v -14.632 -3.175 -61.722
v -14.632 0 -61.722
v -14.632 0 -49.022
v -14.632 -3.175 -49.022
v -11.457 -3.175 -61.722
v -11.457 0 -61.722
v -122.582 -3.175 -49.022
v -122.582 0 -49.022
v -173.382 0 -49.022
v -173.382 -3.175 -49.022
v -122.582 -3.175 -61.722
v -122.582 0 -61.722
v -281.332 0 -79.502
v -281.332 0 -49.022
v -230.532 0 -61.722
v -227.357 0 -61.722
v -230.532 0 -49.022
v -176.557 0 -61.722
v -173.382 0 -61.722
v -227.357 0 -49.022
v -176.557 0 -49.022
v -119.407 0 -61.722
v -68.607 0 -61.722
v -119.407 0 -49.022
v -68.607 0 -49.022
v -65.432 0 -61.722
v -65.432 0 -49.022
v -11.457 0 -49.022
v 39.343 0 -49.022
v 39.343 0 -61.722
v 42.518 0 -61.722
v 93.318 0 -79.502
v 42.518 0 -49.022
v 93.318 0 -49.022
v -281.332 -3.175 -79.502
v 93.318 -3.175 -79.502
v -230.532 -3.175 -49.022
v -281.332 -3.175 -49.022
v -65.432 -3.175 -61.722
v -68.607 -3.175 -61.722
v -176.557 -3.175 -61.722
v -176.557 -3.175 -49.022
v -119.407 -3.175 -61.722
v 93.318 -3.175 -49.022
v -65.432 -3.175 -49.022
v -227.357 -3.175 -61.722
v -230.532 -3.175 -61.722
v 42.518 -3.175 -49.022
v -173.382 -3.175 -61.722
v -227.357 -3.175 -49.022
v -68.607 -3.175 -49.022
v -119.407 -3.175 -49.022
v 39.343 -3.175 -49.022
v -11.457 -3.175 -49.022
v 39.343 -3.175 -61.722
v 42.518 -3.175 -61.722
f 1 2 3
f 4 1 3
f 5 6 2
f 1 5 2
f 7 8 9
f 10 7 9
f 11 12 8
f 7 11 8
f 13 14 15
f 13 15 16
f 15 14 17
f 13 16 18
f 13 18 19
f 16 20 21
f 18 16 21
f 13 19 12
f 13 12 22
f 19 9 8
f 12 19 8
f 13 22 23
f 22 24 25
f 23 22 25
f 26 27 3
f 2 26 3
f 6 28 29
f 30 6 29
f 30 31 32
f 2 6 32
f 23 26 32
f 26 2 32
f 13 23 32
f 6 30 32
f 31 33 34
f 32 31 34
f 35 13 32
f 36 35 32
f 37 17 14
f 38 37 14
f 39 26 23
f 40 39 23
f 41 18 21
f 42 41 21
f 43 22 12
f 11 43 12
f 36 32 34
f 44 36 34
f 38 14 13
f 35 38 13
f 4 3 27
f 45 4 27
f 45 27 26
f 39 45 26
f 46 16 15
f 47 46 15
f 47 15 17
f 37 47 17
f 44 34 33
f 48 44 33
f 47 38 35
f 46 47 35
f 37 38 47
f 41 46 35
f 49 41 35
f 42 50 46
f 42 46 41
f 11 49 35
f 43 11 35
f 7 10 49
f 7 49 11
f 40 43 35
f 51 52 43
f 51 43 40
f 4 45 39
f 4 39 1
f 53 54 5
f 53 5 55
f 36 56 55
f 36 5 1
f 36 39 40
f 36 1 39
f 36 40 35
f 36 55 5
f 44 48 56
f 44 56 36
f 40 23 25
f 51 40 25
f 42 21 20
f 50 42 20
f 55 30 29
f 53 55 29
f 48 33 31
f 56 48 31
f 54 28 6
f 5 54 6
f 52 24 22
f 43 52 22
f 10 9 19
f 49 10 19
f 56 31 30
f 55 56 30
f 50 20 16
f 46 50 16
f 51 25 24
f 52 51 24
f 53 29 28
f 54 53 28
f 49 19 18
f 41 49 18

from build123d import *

# Parameters (mm, degrees)
F1_DEPTH = 3.175


# Not quite as in the source:
# - a length typed as a fraction of an inch, garbled in the dataset ("3 / 203.2 mm" for 3/8 in), is restored


with BuildPart() as f1:
    # F0 (on Front) → F1 (new body)
    with BuildSketch(Plane.XZ):
        Polygon((-230.5319600344, -49.02207428), (-281.3319600344, -49.02207428), (-281.3319600344, -79.50207428), (93.3180399656, -79.50207428), (93.3180399656, -61.72207428), (93.3180399656, -49.02207428), (42.5180399656, -49.02207428), (42.5180399656, -61.72207428), (39.3430399656, -61.72207428), (39.3430399656, -49.02207428), (-11.4569600344, -49.02207428), (-11.4569600344, -61.72207428), (-14.6319600344, -61.72207428), (-14.6319600344, -49.02207428), (-65.4319600344, -49.02207428), (-65.4319600344, -61.72207428), (-68.6069600344, -61.72207428), (-68.6069600344, -49.02207428), (-119.4069600344, -49.02207428), (-119.4069600344, -61.72207428), (-122.5819600344, -61.72207428), (-122.5819600344, -49.02207428), (-173.3819600344, -49.02207428), (-173.3819600344, -61.72207428), (-176.5569600344, -61.72207428), (-176.5569600344, -49.02207428), (-227.3569600344, -49.02207428), (-227.3569600344, -61.72207428), (-230.5319600344, -61.72207428), align=None)
    extrude(amount=F1_DEPTH)


solid = f1.part
